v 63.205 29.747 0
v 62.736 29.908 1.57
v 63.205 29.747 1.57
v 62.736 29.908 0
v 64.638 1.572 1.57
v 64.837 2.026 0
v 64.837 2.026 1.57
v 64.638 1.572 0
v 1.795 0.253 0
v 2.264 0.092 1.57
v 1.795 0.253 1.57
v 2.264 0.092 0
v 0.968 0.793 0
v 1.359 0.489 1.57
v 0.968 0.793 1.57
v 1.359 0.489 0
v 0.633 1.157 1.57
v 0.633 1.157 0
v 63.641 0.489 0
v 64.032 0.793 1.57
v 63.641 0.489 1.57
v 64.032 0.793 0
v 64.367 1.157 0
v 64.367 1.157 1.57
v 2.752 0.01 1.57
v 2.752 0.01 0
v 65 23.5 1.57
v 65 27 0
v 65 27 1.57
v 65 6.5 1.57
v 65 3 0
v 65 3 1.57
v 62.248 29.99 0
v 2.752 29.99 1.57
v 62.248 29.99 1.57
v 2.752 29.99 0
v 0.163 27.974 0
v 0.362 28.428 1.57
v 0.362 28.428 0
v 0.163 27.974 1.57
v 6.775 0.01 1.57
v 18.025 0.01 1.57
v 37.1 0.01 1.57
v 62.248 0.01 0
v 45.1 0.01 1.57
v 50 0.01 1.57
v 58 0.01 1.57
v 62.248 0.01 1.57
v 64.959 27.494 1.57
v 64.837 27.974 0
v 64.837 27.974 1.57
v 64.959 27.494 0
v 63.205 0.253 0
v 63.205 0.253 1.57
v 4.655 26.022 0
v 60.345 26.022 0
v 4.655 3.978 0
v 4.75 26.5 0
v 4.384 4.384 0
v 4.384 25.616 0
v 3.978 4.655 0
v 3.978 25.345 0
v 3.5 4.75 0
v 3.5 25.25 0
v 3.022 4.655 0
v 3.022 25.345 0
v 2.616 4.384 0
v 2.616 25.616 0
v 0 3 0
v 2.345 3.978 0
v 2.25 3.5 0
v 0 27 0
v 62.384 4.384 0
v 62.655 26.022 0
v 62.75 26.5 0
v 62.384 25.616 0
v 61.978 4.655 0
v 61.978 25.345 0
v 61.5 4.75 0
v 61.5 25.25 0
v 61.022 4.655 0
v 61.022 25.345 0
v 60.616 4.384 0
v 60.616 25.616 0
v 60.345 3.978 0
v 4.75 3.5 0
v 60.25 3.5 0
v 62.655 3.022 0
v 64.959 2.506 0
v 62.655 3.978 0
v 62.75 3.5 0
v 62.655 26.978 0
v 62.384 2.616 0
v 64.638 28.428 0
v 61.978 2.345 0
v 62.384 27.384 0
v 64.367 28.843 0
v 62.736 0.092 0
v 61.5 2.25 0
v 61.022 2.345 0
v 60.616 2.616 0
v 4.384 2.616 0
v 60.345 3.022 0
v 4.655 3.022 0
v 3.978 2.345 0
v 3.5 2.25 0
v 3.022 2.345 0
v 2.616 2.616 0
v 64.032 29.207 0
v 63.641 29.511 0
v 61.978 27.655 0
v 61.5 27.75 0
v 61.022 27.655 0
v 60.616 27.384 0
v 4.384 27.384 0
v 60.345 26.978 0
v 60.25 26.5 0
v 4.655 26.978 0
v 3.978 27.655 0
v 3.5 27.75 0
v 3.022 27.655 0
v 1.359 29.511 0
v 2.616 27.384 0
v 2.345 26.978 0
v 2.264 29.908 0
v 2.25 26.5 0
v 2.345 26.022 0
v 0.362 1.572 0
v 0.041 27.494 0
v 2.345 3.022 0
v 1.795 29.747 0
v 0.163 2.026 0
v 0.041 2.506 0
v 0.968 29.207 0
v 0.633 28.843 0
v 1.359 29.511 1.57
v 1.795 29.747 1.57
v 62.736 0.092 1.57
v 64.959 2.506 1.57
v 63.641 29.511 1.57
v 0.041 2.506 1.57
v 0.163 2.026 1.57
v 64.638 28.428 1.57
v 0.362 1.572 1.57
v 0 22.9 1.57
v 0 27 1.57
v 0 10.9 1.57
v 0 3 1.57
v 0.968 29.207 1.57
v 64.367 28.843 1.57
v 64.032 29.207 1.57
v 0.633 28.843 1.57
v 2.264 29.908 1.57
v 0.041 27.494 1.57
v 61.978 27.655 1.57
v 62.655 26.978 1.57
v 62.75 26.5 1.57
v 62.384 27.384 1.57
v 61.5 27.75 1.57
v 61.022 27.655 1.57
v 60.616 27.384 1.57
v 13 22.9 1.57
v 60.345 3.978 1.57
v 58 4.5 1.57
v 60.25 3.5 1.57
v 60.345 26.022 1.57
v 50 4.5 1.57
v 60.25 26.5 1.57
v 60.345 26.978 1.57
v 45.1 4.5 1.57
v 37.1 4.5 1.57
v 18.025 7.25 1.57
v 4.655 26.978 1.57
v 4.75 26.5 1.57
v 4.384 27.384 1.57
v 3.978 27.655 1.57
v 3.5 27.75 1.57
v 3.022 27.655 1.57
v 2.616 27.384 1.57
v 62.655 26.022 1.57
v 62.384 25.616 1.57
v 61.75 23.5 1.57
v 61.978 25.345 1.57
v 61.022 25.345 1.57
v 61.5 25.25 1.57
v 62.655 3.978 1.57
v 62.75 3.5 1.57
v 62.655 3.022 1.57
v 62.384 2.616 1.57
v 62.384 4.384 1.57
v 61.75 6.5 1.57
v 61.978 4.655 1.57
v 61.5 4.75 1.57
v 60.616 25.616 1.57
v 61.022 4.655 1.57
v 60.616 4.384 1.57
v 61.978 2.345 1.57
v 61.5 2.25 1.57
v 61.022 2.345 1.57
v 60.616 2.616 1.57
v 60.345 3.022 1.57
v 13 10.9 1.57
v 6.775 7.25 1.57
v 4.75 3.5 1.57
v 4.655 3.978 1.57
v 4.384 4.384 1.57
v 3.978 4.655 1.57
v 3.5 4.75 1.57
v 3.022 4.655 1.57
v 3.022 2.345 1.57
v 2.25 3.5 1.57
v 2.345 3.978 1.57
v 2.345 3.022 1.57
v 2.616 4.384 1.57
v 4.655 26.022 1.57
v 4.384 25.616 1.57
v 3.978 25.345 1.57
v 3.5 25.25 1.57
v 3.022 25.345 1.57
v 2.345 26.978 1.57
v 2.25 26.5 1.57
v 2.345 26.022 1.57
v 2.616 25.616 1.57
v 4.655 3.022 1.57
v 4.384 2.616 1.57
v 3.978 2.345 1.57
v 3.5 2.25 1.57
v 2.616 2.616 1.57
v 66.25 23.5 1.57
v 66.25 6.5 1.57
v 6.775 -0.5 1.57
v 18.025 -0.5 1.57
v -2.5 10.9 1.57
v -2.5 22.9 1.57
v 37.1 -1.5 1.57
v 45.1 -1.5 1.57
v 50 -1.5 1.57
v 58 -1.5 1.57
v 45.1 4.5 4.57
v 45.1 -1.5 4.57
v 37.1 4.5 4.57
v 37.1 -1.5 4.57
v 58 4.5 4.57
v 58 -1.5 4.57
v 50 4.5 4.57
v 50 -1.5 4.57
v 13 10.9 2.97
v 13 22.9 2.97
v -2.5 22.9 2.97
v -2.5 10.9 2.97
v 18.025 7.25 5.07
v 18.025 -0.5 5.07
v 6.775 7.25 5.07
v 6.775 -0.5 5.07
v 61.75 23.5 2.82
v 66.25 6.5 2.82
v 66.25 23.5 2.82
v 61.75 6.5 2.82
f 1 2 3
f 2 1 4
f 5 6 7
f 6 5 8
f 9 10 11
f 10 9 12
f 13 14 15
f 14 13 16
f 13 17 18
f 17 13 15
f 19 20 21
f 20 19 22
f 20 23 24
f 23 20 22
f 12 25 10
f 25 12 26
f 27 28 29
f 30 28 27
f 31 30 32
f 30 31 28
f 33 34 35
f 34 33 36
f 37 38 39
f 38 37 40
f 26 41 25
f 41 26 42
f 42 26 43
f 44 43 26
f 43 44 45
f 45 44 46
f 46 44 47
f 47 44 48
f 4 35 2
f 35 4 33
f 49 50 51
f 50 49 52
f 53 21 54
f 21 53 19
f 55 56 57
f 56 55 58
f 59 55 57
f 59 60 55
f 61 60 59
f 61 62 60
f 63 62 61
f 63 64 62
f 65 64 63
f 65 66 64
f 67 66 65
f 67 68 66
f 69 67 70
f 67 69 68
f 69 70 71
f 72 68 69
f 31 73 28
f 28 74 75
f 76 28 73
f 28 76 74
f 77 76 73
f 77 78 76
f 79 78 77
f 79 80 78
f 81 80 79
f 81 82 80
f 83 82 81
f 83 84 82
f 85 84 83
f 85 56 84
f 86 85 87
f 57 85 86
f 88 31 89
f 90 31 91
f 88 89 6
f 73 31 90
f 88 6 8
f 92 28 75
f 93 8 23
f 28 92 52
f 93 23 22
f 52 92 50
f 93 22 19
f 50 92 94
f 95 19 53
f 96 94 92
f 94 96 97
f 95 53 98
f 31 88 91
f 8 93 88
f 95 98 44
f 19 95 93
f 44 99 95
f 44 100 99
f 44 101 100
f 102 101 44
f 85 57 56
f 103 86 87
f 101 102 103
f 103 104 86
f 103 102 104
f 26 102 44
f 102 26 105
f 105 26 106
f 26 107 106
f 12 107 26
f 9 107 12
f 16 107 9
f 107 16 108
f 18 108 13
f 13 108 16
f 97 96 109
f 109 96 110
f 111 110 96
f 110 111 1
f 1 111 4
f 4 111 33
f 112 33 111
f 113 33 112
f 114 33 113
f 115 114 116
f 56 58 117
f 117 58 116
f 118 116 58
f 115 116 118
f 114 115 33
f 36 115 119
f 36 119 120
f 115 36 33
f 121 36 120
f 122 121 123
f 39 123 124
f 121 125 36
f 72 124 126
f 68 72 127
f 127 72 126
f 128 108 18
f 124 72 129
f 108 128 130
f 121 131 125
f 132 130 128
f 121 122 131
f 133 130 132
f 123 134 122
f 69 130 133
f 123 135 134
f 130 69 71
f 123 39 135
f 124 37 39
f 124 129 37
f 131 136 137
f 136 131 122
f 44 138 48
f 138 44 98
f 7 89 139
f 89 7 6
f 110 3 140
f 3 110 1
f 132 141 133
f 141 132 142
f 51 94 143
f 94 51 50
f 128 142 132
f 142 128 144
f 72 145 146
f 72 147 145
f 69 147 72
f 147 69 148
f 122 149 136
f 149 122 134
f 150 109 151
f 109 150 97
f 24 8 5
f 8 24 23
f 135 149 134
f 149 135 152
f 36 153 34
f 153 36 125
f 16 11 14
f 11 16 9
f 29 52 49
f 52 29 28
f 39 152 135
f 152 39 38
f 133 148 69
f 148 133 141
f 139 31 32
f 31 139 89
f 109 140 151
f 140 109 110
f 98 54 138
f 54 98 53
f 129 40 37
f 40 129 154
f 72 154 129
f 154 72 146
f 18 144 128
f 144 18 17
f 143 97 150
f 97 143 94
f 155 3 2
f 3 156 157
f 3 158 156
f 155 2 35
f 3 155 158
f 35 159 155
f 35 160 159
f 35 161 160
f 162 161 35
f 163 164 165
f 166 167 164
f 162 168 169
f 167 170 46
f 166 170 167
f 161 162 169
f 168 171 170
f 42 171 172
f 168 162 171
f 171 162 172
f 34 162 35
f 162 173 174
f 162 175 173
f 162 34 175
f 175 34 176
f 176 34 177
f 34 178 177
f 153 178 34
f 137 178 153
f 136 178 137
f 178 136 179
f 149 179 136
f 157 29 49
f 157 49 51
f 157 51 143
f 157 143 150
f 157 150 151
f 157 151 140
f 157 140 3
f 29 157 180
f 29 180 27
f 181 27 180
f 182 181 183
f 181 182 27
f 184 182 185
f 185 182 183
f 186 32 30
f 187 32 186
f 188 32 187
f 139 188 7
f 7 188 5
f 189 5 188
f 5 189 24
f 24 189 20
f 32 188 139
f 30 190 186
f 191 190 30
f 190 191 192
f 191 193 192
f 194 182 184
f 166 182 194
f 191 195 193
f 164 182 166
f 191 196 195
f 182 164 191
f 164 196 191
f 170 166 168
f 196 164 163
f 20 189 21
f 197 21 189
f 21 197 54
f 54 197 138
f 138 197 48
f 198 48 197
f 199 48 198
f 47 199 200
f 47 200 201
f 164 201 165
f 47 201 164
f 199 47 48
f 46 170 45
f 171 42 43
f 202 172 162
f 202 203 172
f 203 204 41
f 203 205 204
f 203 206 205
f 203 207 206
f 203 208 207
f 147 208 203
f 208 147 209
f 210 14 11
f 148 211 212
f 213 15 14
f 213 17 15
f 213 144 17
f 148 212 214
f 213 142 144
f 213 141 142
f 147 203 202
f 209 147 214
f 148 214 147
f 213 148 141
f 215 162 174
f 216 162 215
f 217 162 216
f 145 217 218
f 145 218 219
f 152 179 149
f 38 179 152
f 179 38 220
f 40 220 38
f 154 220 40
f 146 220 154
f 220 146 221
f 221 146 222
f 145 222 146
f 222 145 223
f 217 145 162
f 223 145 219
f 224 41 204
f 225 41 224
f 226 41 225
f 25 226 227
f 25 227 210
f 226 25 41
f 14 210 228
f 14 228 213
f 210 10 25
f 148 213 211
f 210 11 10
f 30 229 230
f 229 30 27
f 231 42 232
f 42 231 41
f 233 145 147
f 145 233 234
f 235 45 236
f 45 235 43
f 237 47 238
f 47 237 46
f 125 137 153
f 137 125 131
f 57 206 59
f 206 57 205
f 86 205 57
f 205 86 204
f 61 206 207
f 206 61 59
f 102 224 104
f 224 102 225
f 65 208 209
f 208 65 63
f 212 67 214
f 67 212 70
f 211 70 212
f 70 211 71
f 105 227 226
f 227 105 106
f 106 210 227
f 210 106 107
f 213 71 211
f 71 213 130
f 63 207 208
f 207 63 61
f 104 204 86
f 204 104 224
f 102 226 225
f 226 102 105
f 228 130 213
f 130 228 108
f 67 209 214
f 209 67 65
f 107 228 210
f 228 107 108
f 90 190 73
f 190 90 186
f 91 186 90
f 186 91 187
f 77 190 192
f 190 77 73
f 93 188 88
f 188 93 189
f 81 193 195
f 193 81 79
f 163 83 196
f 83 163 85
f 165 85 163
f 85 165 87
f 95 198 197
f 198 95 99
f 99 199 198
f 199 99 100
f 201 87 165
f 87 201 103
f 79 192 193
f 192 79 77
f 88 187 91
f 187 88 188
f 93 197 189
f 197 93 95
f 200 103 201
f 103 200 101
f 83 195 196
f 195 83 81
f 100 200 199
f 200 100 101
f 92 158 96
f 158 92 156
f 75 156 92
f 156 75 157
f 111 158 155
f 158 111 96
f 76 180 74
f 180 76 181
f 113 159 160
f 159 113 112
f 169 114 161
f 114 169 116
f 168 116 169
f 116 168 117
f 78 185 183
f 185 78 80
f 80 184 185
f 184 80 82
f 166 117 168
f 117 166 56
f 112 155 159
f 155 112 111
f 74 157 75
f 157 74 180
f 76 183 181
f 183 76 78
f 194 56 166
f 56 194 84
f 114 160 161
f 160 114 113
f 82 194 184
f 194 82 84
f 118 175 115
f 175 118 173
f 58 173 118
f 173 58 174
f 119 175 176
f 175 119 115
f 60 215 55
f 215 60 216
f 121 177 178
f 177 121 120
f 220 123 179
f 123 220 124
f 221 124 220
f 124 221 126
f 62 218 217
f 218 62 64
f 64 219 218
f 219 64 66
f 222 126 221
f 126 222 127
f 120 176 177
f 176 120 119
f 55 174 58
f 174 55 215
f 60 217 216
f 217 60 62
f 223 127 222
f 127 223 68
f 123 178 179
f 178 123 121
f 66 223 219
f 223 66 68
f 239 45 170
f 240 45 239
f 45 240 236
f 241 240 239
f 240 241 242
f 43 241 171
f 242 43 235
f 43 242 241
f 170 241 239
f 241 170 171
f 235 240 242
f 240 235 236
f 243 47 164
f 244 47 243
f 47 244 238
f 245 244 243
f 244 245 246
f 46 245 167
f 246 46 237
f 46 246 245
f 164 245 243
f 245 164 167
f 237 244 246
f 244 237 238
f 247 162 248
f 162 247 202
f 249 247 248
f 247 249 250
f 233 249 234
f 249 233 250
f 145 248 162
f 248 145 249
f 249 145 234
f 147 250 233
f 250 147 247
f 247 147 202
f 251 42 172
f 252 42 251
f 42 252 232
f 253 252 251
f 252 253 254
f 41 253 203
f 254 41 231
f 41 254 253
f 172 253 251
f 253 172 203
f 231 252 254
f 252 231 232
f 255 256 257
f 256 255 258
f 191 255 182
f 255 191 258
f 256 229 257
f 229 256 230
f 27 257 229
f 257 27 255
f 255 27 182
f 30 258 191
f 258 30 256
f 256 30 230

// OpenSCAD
// file: ../util/panel.scad
module rounded_panel(size, r=3) {
  panel(size[0] - 2*r, size[1] - 2*r)
  translate([r, r])
  circle(r);
}

module panel(w, l) {
  hull() {
    for (x=[0, w]) {
      for (y=[0, l]) {
        translate([x, y])
        children();
      }
    }
  }
}
// main file
// From: https://www.raspberrypi.org/documentation/hardware/raspberrypi/mechanical/rpi_MECH_Zero_1p3.pdf
use <../util/panel.scad>;

$fa = 1;
$fs = 0.5;


// This appears to be a standard circuit board size
BOARD_THICKNESS = 1.57;

rpi0();

module rpi0() {
  difference() {
    translate([3, 3])
    panel(l=30 - 6, w=65 - 6)
    cylinder(r=3, h=BOARD_THICKNESS);


    hole([3.5, 3.5]);
    hole([58 + 3.5, 3.5]);
    hole([58 + 3.5, 30 - 3.5]);
    hole([3.5, 30 - 3.5]);
  }

  place(x=41.1)
  usb();

  place(x=54)
  usb();

  place(y=16.9)
  microsd();

  place(x=12.4)
  hdmi();

  place(y=15, x=65)
  mirror([1, 0, 0])
  ribbon();
}

module place(x=0, y=0) {
  translate([x, y, BOARD_THICKNESS])
  children();
}

module hole(pos) {
  translate(pos)
  translate([0, 0, -1])
  cylinder(d=2.5, h=3);
}

module usb() {
  translate([-4, -1.5, 0])
  cube([8, 6, 3]);
}

module microsd() {
  translate([-2.5, -6, 0])
  cube([15.5, 12, 1.4]);
}

module hdmi() {
  translate([-11.25/2, -0.5, 0])
  cube([11.25, 7.75, 3.5]);
}

module ribbon() {
  translate([-1.25, -17/2, 0])
  cube([4.5, 17, 1.25]);
}
